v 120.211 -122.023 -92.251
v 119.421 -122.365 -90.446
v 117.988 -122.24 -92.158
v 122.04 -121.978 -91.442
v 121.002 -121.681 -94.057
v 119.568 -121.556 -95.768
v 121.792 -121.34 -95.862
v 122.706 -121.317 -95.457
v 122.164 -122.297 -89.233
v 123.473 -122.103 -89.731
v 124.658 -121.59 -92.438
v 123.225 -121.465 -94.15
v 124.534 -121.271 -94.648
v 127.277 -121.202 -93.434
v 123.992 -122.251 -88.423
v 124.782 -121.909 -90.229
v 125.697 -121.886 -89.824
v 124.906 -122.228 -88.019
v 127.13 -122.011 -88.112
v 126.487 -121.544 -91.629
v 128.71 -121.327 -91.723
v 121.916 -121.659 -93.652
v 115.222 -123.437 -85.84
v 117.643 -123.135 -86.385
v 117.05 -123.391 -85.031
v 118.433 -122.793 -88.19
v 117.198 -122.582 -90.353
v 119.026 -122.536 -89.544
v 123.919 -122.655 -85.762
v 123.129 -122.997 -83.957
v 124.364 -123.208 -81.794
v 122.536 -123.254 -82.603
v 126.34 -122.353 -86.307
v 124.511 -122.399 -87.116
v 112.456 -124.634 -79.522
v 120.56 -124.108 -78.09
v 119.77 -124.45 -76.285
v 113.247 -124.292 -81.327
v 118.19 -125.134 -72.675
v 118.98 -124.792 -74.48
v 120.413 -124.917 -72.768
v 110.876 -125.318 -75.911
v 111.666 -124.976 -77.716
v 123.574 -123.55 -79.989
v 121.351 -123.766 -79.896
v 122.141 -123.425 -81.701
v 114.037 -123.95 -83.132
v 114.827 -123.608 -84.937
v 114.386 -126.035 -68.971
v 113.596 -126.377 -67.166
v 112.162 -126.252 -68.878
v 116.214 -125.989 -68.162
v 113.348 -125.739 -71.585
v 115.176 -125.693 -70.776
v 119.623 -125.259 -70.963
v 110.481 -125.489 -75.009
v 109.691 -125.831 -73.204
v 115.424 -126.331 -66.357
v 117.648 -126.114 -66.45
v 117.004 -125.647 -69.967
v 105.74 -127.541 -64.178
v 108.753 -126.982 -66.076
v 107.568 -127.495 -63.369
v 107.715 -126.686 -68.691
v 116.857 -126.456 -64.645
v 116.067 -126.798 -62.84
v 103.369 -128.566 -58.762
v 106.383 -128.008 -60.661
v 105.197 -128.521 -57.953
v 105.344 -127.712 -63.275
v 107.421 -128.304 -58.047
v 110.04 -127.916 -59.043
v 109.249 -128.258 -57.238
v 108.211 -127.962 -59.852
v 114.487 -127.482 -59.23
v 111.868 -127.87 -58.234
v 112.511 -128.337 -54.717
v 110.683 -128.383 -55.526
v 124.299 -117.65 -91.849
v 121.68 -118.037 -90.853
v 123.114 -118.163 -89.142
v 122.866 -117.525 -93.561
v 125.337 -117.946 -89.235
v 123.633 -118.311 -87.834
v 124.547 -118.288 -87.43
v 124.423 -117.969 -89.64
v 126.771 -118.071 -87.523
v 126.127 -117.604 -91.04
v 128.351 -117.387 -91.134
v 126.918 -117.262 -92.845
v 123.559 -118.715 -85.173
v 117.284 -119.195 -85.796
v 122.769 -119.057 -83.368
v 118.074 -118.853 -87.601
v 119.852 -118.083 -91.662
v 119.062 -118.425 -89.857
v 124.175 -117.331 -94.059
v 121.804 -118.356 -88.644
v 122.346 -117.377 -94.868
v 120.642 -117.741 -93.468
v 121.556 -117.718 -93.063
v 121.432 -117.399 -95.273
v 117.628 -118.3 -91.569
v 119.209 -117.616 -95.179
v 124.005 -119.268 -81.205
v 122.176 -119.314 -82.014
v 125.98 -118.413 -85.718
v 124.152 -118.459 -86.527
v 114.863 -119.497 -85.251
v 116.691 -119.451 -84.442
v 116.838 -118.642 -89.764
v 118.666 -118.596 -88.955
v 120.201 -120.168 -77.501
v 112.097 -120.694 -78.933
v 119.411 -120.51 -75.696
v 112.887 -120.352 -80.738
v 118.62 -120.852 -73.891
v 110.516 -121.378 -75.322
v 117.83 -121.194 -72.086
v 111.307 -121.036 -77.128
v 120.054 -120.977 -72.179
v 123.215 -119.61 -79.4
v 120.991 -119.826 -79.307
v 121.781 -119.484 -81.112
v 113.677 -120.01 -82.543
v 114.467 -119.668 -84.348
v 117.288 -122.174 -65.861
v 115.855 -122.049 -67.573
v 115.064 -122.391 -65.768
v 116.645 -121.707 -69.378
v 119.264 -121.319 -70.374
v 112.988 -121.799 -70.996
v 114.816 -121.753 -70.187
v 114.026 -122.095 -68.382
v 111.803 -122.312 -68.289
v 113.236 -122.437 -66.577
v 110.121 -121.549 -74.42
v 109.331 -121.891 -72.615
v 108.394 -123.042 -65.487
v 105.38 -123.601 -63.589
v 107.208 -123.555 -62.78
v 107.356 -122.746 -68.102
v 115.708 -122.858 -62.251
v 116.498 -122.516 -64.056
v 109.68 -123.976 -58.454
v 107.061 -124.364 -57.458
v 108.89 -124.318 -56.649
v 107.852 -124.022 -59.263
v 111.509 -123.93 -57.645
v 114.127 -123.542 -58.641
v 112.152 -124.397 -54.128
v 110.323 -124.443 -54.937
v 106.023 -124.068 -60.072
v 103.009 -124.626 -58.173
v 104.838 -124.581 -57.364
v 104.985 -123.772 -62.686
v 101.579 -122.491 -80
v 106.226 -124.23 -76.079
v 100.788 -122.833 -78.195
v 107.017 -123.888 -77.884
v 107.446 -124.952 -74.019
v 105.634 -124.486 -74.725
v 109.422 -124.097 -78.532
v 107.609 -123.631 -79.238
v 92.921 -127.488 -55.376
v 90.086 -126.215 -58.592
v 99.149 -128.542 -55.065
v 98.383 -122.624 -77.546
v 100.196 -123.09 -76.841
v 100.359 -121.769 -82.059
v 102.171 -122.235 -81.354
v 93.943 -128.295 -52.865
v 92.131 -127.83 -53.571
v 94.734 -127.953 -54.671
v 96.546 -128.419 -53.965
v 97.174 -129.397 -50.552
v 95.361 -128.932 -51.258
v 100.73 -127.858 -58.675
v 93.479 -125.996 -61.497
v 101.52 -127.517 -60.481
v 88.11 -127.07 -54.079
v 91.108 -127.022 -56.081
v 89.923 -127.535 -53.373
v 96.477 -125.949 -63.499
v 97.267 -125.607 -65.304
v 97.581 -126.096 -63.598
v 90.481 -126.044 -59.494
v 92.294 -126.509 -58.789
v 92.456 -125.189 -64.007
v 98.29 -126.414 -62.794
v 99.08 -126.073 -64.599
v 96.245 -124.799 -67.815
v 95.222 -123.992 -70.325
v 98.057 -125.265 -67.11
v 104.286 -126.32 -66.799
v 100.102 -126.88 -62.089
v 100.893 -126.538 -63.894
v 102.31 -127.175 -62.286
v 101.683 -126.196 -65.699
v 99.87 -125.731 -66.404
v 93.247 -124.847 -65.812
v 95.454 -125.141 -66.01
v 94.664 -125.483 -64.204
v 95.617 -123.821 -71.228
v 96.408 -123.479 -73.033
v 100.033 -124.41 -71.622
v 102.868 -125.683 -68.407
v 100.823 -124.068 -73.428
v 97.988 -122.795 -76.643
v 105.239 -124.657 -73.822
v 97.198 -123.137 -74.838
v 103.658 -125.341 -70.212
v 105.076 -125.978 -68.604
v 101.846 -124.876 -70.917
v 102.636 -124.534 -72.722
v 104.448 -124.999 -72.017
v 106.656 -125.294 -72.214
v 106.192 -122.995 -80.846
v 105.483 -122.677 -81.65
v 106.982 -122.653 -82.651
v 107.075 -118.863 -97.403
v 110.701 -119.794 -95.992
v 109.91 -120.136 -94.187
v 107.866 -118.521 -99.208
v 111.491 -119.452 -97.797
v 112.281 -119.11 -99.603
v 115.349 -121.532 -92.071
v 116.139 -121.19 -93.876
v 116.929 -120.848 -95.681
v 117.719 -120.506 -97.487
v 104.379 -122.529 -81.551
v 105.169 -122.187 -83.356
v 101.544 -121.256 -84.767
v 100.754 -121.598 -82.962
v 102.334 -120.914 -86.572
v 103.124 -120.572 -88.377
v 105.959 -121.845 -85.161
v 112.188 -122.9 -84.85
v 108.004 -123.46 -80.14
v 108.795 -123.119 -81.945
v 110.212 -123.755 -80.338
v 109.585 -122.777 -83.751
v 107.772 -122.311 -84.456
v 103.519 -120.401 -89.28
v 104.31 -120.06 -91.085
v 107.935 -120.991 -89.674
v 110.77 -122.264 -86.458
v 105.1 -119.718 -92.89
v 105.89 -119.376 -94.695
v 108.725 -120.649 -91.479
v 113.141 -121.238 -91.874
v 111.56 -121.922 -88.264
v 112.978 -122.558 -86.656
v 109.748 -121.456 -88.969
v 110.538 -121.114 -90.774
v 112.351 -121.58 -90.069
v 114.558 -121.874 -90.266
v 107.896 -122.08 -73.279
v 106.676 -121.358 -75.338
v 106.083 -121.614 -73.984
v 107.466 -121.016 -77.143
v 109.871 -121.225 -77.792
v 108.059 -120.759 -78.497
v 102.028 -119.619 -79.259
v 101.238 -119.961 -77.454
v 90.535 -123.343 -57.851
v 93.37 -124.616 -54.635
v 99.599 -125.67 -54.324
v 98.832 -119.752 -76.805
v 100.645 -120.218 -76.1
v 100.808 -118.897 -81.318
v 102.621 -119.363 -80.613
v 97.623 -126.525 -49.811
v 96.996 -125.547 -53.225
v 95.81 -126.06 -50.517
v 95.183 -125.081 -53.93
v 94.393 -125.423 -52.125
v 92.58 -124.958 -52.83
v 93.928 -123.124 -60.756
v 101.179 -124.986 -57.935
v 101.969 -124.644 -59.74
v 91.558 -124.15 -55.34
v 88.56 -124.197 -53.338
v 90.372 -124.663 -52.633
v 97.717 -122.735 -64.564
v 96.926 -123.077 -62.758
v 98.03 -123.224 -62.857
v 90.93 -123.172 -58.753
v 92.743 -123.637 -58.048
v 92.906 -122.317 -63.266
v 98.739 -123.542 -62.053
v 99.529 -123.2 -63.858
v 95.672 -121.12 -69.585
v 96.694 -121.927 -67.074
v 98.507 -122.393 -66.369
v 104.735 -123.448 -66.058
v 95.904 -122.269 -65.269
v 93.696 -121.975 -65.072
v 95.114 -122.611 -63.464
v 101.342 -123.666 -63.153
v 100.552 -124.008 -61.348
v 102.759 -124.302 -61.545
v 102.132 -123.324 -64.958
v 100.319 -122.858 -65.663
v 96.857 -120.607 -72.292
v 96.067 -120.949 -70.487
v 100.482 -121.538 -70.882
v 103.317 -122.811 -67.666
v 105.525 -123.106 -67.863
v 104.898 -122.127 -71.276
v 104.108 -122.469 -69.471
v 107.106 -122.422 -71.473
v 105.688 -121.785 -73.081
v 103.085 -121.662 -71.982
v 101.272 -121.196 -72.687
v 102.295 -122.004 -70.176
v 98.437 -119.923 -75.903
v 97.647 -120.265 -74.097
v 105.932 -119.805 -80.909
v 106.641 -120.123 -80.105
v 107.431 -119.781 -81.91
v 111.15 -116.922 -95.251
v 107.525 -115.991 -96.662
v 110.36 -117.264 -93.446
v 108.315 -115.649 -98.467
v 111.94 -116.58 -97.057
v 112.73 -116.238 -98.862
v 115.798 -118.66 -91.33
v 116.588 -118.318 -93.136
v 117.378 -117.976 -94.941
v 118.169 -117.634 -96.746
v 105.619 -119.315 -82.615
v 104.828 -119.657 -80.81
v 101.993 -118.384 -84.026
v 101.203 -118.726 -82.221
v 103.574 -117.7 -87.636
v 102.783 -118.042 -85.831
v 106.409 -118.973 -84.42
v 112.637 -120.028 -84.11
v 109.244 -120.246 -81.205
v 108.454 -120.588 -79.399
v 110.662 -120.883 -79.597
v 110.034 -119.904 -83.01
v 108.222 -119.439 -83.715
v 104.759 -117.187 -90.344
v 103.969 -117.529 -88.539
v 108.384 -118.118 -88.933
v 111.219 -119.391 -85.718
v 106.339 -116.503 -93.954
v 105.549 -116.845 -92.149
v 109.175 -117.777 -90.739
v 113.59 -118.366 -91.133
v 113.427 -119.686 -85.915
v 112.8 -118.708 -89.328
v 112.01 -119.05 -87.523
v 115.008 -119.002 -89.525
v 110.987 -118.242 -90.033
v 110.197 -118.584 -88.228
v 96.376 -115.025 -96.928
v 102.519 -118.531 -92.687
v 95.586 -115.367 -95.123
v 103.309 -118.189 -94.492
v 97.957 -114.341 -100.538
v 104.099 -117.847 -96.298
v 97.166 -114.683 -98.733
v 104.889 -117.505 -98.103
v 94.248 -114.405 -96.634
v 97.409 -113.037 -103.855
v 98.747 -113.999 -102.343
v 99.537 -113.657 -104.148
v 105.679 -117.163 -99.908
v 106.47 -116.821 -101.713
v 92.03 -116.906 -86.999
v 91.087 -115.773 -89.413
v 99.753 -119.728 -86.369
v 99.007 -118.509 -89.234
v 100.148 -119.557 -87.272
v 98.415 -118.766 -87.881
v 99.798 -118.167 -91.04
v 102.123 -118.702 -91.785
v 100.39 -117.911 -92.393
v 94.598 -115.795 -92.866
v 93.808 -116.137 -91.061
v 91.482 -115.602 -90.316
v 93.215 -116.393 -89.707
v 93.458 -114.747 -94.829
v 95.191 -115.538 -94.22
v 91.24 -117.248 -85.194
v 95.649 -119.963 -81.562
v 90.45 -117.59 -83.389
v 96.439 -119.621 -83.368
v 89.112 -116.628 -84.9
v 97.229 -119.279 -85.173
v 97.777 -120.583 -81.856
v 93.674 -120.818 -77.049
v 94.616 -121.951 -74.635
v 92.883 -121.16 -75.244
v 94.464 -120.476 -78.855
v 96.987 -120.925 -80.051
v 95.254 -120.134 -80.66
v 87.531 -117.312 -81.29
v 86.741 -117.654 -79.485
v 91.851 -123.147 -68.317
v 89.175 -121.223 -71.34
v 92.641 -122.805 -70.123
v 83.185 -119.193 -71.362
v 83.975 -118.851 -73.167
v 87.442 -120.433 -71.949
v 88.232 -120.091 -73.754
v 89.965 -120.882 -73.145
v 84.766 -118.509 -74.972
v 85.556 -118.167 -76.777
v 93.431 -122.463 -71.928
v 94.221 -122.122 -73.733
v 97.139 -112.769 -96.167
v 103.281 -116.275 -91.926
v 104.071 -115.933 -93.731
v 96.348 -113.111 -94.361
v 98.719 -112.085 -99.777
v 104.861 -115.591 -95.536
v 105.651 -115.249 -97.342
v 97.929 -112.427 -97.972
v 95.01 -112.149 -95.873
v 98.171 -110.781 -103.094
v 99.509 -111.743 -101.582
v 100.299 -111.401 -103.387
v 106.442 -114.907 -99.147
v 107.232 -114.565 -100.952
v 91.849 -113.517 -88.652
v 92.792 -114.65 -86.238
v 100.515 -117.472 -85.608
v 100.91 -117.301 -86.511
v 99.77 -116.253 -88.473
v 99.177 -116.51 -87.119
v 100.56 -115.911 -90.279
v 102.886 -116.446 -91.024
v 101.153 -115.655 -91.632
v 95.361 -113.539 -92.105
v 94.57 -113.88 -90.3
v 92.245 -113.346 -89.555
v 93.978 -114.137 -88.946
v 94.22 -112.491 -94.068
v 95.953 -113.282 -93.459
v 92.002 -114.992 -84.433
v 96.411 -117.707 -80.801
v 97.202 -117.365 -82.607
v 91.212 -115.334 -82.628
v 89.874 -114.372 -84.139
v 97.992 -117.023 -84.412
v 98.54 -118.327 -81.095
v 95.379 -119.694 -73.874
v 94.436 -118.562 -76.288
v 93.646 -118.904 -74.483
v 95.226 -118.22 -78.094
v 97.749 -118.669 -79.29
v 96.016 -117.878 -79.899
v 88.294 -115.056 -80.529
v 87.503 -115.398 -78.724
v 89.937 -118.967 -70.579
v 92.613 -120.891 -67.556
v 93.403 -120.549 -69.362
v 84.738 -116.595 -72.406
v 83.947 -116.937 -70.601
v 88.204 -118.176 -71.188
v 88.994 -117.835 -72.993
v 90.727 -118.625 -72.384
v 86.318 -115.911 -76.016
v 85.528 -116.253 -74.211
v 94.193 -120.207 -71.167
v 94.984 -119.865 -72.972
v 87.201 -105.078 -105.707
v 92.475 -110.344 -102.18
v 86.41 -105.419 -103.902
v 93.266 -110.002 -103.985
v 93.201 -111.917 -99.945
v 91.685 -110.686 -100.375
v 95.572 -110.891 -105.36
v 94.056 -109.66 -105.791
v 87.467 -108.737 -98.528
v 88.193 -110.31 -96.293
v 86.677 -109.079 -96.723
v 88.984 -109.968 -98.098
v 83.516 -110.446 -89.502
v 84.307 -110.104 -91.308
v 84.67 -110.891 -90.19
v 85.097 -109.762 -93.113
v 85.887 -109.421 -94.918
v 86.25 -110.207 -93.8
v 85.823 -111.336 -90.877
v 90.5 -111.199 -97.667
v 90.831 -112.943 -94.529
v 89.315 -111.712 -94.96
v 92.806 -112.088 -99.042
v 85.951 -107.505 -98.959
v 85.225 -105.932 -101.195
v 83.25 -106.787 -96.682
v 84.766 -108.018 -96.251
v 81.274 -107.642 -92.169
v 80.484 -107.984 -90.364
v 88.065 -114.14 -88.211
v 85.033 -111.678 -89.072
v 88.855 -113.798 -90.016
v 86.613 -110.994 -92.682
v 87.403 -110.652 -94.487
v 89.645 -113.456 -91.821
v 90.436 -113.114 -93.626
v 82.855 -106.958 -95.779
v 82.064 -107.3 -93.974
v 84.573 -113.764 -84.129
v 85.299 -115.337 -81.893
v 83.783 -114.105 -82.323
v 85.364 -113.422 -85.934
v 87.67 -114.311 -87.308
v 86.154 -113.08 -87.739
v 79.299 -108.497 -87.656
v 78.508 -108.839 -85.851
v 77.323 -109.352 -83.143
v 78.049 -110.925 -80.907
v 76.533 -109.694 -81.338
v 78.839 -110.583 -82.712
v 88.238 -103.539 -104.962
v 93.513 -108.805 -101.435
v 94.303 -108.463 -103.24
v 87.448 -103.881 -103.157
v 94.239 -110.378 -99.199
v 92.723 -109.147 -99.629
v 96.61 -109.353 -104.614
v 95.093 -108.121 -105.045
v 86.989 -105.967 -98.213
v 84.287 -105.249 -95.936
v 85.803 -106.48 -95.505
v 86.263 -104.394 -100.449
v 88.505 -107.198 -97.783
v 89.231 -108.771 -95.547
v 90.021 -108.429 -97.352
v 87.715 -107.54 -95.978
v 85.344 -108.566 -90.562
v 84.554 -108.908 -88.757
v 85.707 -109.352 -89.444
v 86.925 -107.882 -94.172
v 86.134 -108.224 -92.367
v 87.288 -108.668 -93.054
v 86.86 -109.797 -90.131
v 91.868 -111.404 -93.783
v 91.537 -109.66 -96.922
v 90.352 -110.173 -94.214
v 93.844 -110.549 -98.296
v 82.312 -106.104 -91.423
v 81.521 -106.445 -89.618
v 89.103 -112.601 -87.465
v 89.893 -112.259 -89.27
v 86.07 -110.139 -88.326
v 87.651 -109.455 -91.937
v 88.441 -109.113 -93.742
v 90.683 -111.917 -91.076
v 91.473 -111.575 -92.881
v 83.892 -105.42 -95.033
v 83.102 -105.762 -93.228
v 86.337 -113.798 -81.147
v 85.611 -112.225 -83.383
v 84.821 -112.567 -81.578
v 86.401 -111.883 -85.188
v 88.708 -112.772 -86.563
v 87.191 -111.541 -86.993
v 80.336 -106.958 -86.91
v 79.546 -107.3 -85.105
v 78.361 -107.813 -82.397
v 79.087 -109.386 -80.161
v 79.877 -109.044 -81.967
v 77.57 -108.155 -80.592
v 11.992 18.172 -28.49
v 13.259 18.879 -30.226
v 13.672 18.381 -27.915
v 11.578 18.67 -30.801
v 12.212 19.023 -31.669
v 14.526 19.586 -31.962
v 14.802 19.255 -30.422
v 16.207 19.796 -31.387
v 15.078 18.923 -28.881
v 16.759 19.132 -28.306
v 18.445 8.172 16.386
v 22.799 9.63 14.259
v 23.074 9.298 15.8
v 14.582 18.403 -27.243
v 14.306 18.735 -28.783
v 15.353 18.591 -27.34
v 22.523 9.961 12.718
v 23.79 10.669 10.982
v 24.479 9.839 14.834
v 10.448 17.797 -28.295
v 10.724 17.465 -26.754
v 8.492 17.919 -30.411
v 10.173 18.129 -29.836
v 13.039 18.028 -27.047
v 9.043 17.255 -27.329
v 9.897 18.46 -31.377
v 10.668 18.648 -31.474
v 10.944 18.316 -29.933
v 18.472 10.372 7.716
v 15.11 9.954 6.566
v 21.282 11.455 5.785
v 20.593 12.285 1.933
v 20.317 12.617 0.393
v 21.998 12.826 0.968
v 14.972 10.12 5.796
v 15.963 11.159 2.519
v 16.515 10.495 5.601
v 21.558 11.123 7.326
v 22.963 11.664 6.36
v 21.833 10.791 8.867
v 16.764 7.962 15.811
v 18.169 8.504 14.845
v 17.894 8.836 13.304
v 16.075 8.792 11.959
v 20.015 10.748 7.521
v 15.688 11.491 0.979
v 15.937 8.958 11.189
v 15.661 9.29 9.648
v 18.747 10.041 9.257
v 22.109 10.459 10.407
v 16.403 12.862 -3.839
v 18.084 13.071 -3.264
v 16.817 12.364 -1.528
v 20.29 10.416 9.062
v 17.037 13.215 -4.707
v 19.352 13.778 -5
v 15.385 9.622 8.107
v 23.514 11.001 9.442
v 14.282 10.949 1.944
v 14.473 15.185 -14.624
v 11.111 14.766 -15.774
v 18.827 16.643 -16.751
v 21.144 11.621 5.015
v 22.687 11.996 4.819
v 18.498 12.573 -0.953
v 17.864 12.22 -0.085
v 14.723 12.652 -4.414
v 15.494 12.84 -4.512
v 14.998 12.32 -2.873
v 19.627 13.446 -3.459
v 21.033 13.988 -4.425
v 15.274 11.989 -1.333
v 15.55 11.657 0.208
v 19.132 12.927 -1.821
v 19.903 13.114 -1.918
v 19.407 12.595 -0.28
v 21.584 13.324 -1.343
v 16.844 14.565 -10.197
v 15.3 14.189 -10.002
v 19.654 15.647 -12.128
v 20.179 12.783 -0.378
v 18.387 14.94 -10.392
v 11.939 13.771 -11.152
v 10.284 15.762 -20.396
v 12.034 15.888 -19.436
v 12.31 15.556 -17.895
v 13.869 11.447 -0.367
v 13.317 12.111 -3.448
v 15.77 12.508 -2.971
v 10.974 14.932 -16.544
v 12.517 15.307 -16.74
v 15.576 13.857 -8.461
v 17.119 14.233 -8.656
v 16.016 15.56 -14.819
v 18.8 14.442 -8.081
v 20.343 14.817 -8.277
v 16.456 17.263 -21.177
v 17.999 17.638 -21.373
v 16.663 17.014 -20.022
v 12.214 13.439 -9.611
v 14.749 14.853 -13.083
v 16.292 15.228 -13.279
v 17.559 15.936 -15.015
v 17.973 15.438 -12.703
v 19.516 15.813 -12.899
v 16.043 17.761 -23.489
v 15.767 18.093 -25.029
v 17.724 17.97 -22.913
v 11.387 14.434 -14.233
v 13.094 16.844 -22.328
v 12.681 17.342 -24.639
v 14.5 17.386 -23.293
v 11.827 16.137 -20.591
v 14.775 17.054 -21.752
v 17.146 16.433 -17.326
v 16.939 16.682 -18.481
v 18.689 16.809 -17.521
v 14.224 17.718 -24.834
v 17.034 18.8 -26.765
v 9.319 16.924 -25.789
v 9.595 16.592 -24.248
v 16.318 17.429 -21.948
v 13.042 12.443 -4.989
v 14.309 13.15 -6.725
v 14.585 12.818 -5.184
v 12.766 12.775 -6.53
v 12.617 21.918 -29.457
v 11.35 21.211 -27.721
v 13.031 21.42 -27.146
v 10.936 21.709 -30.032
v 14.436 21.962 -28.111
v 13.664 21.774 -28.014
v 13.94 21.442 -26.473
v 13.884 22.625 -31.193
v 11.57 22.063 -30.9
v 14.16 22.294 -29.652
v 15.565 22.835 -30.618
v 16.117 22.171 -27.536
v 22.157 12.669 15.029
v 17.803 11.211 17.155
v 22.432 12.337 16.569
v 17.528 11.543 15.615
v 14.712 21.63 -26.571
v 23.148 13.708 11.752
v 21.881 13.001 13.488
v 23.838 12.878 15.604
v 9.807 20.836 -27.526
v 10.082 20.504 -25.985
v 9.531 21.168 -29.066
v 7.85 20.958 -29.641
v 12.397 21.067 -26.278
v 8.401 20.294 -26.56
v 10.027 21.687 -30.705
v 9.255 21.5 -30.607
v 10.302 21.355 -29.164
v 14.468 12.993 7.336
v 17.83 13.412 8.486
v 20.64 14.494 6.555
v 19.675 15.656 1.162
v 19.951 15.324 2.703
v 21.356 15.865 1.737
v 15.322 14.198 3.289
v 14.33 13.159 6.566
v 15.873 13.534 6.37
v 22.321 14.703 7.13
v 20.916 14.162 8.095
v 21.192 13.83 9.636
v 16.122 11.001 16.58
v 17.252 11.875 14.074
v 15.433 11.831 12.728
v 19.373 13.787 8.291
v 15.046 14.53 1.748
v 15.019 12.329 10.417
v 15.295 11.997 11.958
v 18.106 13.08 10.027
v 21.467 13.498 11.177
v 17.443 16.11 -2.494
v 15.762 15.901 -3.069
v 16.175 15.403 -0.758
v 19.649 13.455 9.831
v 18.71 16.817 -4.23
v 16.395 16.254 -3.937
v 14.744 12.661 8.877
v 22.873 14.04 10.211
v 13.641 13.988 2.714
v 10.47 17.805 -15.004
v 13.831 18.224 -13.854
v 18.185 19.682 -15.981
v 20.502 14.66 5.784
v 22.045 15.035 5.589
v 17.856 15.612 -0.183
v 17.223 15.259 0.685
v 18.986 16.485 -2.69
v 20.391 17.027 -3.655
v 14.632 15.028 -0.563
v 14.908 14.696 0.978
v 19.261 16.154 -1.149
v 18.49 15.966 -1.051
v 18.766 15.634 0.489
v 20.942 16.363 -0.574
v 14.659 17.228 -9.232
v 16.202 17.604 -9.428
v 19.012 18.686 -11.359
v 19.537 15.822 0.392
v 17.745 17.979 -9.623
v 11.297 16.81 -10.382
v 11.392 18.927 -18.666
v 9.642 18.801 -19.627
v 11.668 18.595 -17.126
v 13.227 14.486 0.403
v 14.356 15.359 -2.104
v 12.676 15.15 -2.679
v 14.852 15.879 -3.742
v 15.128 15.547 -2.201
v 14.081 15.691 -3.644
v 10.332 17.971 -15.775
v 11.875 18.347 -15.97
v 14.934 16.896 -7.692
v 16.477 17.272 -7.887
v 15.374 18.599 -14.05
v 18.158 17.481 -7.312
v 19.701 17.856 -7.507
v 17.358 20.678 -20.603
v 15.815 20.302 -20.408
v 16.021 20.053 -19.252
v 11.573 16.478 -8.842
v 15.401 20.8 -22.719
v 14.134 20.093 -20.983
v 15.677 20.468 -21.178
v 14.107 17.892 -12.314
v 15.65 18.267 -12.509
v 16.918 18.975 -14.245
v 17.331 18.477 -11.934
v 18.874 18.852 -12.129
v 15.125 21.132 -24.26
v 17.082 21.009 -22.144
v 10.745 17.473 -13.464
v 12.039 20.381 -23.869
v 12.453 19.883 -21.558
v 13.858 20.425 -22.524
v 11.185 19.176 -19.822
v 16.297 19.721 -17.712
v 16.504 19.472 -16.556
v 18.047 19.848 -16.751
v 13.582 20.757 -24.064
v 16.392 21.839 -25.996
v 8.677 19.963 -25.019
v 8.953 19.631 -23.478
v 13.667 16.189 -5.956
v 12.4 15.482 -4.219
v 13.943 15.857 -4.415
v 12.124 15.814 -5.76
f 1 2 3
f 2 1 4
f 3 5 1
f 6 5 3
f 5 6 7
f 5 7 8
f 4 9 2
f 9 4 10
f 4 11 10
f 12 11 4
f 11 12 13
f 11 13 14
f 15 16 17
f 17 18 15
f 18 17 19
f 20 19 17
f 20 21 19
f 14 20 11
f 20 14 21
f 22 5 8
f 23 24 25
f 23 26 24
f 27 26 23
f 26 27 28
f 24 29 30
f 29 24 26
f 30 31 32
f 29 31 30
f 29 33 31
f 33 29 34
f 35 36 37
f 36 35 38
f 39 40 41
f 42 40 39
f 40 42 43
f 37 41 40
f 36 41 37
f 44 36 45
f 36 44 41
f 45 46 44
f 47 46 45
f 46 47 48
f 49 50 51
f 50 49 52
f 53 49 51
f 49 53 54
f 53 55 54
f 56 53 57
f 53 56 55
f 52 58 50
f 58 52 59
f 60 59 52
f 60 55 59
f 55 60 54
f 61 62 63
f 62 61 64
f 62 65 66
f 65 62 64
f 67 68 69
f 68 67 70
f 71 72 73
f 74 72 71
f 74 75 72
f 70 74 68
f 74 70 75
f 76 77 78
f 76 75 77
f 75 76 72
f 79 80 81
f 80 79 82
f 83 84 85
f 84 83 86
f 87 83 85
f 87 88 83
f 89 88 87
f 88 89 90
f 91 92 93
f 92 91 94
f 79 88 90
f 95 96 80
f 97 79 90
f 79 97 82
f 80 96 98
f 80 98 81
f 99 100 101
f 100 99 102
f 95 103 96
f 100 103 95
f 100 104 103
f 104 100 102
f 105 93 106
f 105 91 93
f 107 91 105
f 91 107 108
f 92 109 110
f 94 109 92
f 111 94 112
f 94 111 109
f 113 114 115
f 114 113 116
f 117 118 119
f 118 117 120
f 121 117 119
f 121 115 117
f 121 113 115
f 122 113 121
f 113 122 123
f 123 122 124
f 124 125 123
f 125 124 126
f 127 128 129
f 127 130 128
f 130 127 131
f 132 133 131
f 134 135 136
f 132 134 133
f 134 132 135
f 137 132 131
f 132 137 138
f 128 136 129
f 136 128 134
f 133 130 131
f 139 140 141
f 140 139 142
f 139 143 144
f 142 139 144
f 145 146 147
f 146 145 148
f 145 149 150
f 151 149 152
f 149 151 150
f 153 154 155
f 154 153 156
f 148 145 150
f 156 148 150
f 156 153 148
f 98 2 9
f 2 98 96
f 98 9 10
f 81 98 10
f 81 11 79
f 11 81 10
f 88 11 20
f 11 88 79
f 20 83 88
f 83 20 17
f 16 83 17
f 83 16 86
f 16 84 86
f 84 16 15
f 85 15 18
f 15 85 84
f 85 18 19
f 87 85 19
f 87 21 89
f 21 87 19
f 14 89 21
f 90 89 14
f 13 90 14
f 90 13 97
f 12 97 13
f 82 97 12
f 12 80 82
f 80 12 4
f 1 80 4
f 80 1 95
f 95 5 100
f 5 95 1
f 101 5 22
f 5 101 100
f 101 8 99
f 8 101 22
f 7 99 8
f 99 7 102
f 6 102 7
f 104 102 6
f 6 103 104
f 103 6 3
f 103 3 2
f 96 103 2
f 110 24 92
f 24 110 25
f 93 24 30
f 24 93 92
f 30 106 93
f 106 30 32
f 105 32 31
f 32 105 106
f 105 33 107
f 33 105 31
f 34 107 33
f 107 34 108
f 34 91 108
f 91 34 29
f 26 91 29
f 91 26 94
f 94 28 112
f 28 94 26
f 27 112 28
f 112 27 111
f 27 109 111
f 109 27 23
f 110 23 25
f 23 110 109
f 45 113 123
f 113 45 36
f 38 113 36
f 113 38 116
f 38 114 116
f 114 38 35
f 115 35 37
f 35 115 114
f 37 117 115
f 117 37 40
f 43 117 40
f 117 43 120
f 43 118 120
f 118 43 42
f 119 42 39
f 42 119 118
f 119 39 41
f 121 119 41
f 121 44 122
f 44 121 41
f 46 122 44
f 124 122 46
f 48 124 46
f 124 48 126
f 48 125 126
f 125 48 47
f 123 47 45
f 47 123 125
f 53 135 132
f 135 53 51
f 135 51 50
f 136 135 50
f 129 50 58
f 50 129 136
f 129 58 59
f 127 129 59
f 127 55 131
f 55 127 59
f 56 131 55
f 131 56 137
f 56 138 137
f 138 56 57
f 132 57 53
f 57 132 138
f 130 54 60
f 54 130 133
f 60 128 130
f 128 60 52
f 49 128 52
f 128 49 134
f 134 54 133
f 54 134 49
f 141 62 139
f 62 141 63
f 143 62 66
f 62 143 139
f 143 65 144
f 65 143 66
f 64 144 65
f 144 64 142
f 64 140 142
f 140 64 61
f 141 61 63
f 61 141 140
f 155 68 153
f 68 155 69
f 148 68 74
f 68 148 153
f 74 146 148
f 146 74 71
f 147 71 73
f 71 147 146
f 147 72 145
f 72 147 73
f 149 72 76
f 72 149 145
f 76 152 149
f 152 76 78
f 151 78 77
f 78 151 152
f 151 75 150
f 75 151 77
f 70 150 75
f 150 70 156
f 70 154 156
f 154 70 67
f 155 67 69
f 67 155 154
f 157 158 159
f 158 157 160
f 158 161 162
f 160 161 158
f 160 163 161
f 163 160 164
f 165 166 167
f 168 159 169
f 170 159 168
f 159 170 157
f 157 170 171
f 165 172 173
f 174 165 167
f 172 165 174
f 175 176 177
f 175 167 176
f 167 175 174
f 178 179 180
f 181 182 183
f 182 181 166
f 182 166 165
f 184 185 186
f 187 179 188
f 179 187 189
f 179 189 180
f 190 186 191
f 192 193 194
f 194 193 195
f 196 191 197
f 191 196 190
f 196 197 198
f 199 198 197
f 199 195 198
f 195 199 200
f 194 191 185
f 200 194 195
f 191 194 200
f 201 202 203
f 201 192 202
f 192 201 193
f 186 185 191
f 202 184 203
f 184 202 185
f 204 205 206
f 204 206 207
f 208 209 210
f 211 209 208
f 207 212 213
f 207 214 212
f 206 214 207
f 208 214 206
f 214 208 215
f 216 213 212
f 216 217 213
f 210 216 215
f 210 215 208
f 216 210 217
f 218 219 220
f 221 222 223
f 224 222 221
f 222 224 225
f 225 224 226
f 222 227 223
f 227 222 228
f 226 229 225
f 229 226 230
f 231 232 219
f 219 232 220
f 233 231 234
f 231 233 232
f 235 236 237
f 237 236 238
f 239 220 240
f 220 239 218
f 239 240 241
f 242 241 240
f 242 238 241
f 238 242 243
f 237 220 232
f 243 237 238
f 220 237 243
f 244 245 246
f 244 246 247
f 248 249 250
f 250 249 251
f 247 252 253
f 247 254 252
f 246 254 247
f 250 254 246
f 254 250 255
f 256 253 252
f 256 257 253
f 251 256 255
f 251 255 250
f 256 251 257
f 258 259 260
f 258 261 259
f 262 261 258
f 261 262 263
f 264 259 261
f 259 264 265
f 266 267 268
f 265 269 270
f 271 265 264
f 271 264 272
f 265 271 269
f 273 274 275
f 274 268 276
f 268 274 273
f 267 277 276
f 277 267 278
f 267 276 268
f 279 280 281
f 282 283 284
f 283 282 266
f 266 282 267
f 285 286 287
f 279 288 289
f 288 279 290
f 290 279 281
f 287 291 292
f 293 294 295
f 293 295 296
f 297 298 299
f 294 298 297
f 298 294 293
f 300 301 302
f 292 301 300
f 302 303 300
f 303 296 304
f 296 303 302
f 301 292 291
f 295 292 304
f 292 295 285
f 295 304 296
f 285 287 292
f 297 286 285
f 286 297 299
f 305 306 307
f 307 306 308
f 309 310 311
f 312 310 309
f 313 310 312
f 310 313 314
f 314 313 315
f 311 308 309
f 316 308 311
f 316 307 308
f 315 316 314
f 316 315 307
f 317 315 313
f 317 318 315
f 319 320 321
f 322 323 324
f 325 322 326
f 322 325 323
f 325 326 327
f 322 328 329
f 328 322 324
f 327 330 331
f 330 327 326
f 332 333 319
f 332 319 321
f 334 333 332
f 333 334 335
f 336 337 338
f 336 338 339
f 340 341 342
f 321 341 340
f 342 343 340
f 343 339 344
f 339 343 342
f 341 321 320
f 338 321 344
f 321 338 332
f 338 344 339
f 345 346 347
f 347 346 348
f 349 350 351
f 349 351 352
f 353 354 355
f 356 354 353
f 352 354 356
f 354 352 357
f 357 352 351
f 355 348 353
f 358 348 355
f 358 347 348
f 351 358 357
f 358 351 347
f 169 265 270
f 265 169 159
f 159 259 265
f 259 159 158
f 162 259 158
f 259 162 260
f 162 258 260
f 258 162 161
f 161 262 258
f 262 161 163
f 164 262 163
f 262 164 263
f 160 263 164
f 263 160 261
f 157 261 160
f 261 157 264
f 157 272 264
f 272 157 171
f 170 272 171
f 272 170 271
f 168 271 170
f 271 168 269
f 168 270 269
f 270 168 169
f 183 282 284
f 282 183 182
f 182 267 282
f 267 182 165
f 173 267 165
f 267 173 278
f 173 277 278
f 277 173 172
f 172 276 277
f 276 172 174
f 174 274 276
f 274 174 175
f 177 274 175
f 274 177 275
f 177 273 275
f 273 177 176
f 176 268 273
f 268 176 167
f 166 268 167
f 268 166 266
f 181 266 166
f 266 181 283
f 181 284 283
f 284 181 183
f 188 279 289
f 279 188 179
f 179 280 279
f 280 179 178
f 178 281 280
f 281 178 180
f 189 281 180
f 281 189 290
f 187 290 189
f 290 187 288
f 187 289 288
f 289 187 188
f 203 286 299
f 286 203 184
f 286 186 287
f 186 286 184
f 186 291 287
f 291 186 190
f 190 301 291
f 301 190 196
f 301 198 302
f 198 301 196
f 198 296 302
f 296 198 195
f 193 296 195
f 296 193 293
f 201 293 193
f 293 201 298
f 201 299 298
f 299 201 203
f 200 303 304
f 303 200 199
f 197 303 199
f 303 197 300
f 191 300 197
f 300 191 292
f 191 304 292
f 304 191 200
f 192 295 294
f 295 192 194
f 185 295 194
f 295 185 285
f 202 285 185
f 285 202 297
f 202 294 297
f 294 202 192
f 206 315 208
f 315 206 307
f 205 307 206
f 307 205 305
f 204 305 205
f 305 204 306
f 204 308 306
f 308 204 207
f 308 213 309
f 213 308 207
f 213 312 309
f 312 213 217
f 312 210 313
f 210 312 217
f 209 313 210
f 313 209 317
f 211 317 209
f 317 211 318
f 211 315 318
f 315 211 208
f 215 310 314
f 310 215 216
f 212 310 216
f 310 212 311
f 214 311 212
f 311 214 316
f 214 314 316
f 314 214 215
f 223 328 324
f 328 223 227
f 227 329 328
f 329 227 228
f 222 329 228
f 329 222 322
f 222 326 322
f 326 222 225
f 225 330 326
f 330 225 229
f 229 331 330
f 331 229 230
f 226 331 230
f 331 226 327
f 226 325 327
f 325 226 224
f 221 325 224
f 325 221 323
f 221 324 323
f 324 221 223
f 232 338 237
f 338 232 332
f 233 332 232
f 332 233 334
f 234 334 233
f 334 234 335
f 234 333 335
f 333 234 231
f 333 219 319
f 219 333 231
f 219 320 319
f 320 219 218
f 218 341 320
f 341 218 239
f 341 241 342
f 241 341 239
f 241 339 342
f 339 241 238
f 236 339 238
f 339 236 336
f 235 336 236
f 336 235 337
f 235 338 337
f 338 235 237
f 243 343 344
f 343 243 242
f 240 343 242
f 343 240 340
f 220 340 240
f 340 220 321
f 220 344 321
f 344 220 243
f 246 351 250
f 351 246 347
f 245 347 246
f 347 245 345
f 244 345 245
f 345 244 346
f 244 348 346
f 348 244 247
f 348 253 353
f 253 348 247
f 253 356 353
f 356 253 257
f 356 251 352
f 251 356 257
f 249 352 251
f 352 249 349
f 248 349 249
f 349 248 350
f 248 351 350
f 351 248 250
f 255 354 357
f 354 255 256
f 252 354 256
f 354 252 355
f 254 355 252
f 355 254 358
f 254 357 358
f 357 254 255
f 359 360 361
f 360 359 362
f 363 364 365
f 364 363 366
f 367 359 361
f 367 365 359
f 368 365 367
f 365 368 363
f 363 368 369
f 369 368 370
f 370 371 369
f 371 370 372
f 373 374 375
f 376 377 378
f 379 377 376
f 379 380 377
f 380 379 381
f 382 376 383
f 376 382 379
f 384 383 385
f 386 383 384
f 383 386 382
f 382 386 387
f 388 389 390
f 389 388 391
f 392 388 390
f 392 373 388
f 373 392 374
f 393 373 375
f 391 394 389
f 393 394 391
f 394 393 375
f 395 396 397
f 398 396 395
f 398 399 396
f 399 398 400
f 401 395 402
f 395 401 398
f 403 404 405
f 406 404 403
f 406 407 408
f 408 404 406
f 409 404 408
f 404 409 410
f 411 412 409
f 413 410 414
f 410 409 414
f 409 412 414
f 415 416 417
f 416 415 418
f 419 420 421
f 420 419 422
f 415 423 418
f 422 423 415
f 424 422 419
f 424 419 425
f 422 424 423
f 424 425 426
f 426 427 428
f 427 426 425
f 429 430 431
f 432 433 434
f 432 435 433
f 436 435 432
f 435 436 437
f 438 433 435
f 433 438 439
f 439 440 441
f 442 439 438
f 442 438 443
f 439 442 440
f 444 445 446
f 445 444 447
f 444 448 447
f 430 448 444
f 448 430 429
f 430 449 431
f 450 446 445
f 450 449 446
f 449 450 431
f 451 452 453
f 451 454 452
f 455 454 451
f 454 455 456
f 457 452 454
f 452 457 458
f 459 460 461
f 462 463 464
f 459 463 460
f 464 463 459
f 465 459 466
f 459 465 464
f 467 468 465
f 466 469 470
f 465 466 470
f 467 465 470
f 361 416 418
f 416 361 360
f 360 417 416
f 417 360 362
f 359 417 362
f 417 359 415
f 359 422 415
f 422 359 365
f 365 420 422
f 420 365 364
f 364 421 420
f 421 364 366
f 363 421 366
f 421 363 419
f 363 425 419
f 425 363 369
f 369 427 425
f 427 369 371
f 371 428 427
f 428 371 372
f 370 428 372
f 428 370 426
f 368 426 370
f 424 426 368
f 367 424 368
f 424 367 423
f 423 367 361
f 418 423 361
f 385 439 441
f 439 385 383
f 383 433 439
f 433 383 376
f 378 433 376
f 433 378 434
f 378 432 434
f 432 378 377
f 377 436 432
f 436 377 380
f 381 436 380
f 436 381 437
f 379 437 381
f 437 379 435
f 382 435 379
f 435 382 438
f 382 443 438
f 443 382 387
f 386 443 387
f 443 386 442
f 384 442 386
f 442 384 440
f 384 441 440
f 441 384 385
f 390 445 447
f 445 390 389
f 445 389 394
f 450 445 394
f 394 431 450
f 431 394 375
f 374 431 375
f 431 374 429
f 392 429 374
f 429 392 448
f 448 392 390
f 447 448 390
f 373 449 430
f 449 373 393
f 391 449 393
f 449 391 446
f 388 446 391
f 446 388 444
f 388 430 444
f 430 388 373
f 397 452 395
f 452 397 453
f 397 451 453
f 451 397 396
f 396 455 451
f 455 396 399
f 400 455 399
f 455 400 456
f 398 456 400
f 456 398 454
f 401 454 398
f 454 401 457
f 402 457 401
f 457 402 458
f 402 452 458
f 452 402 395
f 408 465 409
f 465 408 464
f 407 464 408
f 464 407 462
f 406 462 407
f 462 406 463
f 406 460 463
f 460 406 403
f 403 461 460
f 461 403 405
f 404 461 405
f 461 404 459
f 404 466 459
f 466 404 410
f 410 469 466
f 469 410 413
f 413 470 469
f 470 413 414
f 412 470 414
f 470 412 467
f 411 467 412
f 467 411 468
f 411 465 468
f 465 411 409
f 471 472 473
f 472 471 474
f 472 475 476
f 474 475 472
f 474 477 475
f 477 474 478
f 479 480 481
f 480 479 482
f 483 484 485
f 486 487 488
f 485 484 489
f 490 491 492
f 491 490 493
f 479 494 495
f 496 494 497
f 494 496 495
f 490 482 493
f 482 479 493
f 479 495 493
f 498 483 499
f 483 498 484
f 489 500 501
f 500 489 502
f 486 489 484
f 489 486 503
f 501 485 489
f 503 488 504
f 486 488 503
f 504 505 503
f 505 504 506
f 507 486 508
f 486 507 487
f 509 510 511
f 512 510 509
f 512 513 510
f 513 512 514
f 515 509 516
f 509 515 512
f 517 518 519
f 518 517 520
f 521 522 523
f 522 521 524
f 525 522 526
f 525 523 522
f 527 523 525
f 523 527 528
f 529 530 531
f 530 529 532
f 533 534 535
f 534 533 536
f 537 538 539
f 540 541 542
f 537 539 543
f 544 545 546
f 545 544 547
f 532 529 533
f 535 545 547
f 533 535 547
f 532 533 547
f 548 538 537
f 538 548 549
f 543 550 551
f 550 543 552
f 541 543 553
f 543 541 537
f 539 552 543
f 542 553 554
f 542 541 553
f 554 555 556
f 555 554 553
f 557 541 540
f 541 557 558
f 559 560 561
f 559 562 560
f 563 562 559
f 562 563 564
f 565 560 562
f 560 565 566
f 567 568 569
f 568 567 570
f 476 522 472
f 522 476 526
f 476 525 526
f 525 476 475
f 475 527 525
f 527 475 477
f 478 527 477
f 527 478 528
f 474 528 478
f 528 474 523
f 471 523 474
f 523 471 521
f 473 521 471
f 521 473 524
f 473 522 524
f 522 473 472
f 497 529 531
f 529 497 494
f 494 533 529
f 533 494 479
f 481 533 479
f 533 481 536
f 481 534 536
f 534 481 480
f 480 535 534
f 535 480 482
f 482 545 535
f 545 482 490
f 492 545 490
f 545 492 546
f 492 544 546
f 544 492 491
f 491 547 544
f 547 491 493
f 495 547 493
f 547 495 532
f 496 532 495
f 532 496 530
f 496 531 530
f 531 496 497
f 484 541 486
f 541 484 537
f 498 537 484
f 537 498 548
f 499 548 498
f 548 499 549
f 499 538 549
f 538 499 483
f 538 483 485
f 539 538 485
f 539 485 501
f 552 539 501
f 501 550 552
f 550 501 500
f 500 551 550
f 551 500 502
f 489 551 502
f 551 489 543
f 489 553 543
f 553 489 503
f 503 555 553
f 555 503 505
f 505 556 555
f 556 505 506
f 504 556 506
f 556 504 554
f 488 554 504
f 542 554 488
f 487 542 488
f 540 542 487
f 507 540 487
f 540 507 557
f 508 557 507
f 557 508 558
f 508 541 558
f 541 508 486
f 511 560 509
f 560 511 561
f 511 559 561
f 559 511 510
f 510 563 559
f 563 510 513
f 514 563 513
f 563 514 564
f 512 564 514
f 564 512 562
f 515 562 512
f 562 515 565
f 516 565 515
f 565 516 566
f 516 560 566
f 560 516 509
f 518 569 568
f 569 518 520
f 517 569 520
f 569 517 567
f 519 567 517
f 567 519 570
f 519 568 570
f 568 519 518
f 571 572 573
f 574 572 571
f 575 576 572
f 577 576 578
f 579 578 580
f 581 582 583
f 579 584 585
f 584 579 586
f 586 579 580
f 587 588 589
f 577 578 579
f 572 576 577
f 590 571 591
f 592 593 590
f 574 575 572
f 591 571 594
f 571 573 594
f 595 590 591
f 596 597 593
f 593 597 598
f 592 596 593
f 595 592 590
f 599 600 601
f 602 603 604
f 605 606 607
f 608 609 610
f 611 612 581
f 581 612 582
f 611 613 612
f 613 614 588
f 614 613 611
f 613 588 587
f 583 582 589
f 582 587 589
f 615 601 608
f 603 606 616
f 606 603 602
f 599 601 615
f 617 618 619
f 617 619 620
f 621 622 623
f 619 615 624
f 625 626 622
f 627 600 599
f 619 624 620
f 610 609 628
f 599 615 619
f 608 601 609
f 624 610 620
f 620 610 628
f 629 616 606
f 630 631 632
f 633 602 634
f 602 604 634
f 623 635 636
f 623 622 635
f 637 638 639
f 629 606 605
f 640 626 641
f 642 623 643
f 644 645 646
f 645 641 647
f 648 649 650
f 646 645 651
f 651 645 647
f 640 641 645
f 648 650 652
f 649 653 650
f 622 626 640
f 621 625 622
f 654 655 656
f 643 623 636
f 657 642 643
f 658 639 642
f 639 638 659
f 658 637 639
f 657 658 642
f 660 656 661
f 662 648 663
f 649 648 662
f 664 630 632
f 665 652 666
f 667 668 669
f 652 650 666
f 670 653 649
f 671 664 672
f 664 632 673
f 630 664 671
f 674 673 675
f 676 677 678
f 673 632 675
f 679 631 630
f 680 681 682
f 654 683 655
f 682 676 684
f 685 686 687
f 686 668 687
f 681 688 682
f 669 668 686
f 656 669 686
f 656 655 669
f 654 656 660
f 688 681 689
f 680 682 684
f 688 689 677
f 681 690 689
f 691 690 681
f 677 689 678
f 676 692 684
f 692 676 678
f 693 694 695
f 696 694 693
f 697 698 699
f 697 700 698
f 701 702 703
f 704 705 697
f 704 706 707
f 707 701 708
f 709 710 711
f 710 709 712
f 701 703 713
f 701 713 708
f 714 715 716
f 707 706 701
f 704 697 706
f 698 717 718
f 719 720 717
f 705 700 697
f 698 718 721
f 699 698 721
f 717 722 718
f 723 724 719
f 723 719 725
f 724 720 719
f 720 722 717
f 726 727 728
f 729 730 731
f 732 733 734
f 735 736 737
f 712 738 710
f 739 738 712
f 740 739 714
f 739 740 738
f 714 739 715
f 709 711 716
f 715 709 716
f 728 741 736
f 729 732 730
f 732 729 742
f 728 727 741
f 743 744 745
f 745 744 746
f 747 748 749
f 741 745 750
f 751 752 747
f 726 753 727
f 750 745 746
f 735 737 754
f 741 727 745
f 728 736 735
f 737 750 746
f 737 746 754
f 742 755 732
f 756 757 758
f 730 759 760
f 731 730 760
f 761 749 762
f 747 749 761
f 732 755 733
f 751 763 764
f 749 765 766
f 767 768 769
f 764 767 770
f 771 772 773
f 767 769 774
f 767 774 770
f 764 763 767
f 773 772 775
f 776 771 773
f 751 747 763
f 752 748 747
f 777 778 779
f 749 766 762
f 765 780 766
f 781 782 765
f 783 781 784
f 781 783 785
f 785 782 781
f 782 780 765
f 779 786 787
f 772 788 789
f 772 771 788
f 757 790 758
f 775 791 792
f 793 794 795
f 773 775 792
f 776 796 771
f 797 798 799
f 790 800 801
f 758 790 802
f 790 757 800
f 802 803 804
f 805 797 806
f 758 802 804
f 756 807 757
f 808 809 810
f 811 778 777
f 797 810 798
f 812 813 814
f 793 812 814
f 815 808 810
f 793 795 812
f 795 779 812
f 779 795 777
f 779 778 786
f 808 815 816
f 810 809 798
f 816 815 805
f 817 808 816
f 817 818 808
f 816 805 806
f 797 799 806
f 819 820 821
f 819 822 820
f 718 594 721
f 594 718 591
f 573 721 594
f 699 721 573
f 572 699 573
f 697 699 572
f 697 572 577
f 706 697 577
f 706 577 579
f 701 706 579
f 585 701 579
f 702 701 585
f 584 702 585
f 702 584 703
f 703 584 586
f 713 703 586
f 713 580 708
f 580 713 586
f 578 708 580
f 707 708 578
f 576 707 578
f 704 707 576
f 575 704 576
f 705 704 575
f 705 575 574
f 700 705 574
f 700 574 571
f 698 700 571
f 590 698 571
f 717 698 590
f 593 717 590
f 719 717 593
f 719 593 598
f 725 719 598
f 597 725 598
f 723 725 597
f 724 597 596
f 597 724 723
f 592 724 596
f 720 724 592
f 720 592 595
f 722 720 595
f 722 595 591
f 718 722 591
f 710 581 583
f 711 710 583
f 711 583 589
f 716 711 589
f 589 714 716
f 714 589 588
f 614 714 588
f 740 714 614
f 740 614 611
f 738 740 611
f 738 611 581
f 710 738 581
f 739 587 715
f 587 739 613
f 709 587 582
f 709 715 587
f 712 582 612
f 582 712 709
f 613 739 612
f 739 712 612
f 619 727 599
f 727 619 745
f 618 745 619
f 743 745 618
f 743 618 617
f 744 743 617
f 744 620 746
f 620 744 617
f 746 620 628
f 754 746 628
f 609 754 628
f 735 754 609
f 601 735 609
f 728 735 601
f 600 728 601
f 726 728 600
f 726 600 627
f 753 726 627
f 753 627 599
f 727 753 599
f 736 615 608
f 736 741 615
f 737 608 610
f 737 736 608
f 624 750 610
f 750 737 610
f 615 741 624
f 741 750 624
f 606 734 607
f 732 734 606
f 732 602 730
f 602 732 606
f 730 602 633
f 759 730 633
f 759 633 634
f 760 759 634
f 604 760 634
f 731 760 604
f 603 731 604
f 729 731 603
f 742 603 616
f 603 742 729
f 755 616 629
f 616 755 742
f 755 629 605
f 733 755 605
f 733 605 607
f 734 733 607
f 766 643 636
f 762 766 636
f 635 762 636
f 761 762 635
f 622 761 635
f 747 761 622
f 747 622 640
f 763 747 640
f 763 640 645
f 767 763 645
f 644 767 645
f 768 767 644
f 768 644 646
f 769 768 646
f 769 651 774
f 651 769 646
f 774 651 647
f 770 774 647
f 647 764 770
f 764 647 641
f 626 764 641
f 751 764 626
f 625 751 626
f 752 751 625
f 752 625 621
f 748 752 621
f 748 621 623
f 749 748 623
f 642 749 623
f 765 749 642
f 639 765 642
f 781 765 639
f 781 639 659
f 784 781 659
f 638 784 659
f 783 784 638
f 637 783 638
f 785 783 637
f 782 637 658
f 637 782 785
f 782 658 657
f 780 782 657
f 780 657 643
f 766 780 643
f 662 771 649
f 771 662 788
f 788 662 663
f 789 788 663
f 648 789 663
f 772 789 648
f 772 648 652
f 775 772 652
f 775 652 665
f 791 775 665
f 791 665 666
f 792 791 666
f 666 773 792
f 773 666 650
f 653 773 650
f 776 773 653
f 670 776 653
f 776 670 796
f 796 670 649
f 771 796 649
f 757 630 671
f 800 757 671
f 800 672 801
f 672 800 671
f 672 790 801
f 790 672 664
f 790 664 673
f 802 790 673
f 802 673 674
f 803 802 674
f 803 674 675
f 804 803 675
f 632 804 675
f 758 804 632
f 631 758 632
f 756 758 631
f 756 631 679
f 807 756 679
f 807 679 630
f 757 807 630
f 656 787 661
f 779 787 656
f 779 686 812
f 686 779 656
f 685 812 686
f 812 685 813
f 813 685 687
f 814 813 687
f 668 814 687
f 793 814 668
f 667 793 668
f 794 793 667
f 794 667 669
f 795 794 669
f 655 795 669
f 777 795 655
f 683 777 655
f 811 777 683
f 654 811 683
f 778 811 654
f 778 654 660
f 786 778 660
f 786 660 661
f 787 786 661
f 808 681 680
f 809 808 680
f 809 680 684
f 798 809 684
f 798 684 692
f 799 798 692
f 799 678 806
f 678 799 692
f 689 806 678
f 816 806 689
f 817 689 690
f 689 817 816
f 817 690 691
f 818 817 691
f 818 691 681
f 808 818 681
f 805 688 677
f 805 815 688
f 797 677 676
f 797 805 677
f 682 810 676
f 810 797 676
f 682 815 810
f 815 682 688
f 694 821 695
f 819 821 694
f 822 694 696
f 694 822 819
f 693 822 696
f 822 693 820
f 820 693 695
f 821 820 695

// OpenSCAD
// file: Spiff.scad
include <spiffsans.scad>

module write(string,font=spiffsans,spacing=1,i=0) {
  if (i < len(string)) {
    assign(charindex = search(string[i],font,1)[0])
    
    // If the character is in the font
    if (charindex != undef) {
      assign(glyph = font[charindex][2])
      if (glyph){
        polygon(points=glyph[0], paths=glyph[1]);
      }
      translate([font[charindex][1] + spacing, 0, 0])
        write(string, font, spacing, i=i+1);
    } else {
      assign(glyph = font[0][2])
      if (glyph){
        polygon(points=glyph[0], paths=glyph[1]);
      }
      translate([font[0][1] + spacing,0,0])
        write(string, font, spacing, i=i+1);
    }
  }
}
// main file
 use <Spiff.scad>;

// Viewport translation -
// the whole model was rotated to catch the light,
// then the viewport was rolled around for a good angle
rotate([ 94.50, 0.00, 113.40 ]) translate([ 8.48, -1.12, 15.65 ])
{
	translate([-150,-100,37]) rotate([25,30,90]){
		translate([0,24, 10]) rotate([45,0,0])
			linear_extrude(height=4) write("Simple");
		translate([0,13, 4]) rotate([30,0,0])
			linear_extrude(height=3) write("variable");
		translate([0,1, 0])  rotate([20,0,0])
			linear_extrude(height=2.5) write("width");
		translate([0,-12, -1])  rotate([5,0,0])
			linear_extrude(height=2) write("text.");
	}
	scale(0.8)translate([6,-36, 2]) rotate([80,0,105])
		# linear_extrude(height=4) write("Spiff.scad");
}
